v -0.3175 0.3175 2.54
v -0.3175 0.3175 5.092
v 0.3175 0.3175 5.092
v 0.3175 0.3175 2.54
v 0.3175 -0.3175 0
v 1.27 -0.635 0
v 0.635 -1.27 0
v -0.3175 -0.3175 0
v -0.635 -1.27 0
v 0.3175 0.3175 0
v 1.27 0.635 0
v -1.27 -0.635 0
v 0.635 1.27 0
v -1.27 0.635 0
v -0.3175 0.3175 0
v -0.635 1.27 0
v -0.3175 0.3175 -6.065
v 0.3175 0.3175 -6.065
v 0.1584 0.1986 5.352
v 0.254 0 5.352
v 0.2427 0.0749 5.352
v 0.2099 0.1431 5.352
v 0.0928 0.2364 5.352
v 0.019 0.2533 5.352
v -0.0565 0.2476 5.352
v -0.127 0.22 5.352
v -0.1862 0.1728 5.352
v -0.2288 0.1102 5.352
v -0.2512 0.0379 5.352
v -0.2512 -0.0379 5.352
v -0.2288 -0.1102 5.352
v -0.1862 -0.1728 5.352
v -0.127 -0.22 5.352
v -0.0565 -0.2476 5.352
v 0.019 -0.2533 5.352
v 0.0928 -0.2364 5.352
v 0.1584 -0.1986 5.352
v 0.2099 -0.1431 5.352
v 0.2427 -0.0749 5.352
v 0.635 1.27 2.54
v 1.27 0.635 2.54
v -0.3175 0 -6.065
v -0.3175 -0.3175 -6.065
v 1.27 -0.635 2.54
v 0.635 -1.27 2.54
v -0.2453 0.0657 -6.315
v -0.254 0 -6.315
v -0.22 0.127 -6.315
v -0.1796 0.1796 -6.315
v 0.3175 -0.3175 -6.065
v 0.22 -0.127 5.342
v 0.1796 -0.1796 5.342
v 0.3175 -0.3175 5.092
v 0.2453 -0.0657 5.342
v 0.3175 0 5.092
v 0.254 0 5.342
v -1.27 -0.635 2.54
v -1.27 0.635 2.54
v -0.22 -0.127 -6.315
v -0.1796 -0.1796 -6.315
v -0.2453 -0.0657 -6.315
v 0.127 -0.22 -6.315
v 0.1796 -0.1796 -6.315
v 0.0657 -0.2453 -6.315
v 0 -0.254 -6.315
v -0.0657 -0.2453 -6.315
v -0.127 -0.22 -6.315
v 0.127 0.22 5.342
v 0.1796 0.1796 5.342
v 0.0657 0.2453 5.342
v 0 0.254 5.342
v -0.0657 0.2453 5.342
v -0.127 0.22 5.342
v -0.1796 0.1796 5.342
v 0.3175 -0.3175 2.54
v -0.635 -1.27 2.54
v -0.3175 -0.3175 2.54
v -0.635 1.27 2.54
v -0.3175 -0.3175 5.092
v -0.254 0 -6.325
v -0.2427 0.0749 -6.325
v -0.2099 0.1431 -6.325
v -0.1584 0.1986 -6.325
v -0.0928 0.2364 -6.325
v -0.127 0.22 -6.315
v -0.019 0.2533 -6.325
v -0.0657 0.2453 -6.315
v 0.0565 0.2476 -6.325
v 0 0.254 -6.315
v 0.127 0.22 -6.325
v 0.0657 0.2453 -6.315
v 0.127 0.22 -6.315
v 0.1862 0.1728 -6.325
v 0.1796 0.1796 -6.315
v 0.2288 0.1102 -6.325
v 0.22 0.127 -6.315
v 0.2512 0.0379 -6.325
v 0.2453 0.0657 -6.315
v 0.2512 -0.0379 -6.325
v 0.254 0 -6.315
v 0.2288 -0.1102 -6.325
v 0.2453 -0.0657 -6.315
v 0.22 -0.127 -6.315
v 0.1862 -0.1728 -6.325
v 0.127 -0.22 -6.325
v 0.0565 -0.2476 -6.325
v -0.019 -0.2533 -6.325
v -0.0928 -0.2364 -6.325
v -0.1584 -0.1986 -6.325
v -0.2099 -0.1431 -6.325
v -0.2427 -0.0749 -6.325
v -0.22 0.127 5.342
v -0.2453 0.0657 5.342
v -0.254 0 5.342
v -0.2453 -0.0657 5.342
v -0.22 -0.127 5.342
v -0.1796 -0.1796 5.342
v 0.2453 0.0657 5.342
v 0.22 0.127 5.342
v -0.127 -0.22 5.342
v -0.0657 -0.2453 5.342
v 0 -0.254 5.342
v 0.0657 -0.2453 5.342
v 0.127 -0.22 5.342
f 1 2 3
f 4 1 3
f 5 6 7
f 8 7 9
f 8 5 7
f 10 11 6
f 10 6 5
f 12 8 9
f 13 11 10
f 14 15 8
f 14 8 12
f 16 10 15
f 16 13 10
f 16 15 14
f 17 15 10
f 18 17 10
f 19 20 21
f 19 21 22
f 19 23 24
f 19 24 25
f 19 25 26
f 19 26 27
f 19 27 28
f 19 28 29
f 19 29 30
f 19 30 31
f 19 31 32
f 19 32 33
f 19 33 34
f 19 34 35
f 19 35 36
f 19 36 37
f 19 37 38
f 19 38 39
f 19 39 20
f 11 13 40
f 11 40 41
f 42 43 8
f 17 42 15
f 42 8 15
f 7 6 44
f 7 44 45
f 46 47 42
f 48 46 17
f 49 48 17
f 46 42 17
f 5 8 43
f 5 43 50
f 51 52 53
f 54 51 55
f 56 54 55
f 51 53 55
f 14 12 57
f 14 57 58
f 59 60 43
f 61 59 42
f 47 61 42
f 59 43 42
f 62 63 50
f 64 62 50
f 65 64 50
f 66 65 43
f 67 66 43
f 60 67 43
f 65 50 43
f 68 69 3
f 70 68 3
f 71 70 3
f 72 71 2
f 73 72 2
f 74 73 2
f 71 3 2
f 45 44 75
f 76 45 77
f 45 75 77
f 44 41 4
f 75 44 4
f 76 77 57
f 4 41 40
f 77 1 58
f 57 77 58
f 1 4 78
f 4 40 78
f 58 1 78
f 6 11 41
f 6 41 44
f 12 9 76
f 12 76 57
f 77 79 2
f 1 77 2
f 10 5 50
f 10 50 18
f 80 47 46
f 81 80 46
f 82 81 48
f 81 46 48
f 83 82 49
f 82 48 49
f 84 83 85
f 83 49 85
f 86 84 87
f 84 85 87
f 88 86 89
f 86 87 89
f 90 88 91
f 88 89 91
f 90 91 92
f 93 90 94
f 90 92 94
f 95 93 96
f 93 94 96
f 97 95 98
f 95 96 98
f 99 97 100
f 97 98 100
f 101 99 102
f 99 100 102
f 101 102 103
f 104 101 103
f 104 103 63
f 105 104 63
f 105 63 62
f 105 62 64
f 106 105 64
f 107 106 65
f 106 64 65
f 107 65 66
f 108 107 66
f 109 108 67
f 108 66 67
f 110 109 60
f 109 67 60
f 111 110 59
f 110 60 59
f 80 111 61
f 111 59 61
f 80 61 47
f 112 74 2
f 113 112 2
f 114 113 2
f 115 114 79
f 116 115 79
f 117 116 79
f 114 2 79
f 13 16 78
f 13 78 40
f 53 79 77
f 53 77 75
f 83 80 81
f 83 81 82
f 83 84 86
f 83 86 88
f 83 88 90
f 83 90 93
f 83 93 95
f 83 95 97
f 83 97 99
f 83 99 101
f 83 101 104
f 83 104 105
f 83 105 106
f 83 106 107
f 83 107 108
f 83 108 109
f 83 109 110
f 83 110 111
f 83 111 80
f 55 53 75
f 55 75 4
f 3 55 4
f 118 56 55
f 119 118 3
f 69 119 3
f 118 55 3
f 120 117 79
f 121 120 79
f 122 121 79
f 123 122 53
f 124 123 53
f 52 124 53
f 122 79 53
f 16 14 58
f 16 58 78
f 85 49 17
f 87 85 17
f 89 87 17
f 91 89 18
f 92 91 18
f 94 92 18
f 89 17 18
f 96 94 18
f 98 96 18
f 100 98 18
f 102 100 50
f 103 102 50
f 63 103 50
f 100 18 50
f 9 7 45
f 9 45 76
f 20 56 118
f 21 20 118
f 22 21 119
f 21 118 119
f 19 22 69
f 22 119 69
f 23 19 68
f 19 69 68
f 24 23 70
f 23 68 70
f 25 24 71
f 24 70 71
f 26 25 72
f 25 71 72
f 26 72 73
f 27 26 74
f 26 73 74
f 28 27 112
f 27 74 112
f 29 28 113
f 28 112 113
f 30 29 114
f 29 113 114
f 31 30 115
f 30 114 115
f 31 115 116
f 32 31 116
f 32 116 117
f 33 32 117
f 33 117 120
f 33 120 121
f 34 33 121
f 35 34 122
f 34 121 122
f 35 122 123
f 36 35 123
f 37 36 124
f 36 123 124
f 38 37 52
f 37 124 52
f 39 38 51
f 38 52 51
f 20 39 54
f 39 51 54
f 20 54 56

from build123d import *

# Parameters (mm, degrees)
SKETCH1_W           = 0.635
SKETCH1_H           = 0.635
BOSS_EXTRUDE1_DEPTH = 11.157
BOSS_EXTRUDE2_DEPTH = 2.54
SKETCH3_R           = 0.254
SKETCH4_R           = 0.254
SKETCH6_R           = 0.254
BOSS_EXTRUDE3_DEPTH = 0.01
SKETCH7_R           = 0.254
BOSS_EXTRUDE4_DEPTH = 0.01


with BuildPart() as part:
    # Sketch1 → Boss-Extrude1 (new body)
    with BuildSketch(Plane.XY.offset(5.092)):
        Rectangle(SKETCH1_W, SKETCH1_H)
    extrude(amount=-BOSS_EXTRUDE1_DEPTH)

    # Sketch2 → Boss-Extrude2 (add)
    with BuildSketch(Plane.XY):
        Polygon((-1.27, 0.635), (-0.635, 1.27), (0.635, 1.27), (1.27, 0.635), (1.27, -0.635), (0.635, -1.27), (-0.635, -1.27), (-1.27, -0.635), align=None)
    extrude(amount=BOSS_EXTRUDE2_DEPTH)

    # Sketch3 → section 0 of loft1
    with BuildSketch(Plane.XY.offset(5.342), mode=Mode.PRIVATE) as loft1_s0:
        Circle(SKETCH3_R)
    # loft up to a face of the part (loft1)
    loft([loft1_s0.sketch, part.faces().sort_by_distance((0, 0, 5.092))[0]])

    # Sketch4 → section 0 of loft2
    with BuildSketch(Plane(origin=(0, 0, -6.315), x_dir=(-1, 0, 0), z_dir=(0, 0, -1)), mode=Mode.PRIVATE) as loft2_s0:
        Circle(SKETCH4_R)
    # loft up to a face of the part (loft2)
    loft([loft2_s0.sketch, part.faces().sort_by_distance((0, 0, -6.065))[0]])

    # Sketch6 → Boss-Extrude3 (add)
    with BuildSketch(Plane.XY.offset(5.342)):
        Circle(SKETCH6_R)
    extrude(amount=BOSS_EXTRUDE3_DEPTH)

    # Sketch7 → Boss-Extrude4 (add)
    with BuildSketch(Plane(origin=(0, 0, -6.315), x_dir=(-1, 0, 0), z_dir=(0, 0, -1))):
        Circle(SKETCH7_R)
    extrude(amount=BOSS_EXTRUDE4_DEPTH)


solid = part.part
